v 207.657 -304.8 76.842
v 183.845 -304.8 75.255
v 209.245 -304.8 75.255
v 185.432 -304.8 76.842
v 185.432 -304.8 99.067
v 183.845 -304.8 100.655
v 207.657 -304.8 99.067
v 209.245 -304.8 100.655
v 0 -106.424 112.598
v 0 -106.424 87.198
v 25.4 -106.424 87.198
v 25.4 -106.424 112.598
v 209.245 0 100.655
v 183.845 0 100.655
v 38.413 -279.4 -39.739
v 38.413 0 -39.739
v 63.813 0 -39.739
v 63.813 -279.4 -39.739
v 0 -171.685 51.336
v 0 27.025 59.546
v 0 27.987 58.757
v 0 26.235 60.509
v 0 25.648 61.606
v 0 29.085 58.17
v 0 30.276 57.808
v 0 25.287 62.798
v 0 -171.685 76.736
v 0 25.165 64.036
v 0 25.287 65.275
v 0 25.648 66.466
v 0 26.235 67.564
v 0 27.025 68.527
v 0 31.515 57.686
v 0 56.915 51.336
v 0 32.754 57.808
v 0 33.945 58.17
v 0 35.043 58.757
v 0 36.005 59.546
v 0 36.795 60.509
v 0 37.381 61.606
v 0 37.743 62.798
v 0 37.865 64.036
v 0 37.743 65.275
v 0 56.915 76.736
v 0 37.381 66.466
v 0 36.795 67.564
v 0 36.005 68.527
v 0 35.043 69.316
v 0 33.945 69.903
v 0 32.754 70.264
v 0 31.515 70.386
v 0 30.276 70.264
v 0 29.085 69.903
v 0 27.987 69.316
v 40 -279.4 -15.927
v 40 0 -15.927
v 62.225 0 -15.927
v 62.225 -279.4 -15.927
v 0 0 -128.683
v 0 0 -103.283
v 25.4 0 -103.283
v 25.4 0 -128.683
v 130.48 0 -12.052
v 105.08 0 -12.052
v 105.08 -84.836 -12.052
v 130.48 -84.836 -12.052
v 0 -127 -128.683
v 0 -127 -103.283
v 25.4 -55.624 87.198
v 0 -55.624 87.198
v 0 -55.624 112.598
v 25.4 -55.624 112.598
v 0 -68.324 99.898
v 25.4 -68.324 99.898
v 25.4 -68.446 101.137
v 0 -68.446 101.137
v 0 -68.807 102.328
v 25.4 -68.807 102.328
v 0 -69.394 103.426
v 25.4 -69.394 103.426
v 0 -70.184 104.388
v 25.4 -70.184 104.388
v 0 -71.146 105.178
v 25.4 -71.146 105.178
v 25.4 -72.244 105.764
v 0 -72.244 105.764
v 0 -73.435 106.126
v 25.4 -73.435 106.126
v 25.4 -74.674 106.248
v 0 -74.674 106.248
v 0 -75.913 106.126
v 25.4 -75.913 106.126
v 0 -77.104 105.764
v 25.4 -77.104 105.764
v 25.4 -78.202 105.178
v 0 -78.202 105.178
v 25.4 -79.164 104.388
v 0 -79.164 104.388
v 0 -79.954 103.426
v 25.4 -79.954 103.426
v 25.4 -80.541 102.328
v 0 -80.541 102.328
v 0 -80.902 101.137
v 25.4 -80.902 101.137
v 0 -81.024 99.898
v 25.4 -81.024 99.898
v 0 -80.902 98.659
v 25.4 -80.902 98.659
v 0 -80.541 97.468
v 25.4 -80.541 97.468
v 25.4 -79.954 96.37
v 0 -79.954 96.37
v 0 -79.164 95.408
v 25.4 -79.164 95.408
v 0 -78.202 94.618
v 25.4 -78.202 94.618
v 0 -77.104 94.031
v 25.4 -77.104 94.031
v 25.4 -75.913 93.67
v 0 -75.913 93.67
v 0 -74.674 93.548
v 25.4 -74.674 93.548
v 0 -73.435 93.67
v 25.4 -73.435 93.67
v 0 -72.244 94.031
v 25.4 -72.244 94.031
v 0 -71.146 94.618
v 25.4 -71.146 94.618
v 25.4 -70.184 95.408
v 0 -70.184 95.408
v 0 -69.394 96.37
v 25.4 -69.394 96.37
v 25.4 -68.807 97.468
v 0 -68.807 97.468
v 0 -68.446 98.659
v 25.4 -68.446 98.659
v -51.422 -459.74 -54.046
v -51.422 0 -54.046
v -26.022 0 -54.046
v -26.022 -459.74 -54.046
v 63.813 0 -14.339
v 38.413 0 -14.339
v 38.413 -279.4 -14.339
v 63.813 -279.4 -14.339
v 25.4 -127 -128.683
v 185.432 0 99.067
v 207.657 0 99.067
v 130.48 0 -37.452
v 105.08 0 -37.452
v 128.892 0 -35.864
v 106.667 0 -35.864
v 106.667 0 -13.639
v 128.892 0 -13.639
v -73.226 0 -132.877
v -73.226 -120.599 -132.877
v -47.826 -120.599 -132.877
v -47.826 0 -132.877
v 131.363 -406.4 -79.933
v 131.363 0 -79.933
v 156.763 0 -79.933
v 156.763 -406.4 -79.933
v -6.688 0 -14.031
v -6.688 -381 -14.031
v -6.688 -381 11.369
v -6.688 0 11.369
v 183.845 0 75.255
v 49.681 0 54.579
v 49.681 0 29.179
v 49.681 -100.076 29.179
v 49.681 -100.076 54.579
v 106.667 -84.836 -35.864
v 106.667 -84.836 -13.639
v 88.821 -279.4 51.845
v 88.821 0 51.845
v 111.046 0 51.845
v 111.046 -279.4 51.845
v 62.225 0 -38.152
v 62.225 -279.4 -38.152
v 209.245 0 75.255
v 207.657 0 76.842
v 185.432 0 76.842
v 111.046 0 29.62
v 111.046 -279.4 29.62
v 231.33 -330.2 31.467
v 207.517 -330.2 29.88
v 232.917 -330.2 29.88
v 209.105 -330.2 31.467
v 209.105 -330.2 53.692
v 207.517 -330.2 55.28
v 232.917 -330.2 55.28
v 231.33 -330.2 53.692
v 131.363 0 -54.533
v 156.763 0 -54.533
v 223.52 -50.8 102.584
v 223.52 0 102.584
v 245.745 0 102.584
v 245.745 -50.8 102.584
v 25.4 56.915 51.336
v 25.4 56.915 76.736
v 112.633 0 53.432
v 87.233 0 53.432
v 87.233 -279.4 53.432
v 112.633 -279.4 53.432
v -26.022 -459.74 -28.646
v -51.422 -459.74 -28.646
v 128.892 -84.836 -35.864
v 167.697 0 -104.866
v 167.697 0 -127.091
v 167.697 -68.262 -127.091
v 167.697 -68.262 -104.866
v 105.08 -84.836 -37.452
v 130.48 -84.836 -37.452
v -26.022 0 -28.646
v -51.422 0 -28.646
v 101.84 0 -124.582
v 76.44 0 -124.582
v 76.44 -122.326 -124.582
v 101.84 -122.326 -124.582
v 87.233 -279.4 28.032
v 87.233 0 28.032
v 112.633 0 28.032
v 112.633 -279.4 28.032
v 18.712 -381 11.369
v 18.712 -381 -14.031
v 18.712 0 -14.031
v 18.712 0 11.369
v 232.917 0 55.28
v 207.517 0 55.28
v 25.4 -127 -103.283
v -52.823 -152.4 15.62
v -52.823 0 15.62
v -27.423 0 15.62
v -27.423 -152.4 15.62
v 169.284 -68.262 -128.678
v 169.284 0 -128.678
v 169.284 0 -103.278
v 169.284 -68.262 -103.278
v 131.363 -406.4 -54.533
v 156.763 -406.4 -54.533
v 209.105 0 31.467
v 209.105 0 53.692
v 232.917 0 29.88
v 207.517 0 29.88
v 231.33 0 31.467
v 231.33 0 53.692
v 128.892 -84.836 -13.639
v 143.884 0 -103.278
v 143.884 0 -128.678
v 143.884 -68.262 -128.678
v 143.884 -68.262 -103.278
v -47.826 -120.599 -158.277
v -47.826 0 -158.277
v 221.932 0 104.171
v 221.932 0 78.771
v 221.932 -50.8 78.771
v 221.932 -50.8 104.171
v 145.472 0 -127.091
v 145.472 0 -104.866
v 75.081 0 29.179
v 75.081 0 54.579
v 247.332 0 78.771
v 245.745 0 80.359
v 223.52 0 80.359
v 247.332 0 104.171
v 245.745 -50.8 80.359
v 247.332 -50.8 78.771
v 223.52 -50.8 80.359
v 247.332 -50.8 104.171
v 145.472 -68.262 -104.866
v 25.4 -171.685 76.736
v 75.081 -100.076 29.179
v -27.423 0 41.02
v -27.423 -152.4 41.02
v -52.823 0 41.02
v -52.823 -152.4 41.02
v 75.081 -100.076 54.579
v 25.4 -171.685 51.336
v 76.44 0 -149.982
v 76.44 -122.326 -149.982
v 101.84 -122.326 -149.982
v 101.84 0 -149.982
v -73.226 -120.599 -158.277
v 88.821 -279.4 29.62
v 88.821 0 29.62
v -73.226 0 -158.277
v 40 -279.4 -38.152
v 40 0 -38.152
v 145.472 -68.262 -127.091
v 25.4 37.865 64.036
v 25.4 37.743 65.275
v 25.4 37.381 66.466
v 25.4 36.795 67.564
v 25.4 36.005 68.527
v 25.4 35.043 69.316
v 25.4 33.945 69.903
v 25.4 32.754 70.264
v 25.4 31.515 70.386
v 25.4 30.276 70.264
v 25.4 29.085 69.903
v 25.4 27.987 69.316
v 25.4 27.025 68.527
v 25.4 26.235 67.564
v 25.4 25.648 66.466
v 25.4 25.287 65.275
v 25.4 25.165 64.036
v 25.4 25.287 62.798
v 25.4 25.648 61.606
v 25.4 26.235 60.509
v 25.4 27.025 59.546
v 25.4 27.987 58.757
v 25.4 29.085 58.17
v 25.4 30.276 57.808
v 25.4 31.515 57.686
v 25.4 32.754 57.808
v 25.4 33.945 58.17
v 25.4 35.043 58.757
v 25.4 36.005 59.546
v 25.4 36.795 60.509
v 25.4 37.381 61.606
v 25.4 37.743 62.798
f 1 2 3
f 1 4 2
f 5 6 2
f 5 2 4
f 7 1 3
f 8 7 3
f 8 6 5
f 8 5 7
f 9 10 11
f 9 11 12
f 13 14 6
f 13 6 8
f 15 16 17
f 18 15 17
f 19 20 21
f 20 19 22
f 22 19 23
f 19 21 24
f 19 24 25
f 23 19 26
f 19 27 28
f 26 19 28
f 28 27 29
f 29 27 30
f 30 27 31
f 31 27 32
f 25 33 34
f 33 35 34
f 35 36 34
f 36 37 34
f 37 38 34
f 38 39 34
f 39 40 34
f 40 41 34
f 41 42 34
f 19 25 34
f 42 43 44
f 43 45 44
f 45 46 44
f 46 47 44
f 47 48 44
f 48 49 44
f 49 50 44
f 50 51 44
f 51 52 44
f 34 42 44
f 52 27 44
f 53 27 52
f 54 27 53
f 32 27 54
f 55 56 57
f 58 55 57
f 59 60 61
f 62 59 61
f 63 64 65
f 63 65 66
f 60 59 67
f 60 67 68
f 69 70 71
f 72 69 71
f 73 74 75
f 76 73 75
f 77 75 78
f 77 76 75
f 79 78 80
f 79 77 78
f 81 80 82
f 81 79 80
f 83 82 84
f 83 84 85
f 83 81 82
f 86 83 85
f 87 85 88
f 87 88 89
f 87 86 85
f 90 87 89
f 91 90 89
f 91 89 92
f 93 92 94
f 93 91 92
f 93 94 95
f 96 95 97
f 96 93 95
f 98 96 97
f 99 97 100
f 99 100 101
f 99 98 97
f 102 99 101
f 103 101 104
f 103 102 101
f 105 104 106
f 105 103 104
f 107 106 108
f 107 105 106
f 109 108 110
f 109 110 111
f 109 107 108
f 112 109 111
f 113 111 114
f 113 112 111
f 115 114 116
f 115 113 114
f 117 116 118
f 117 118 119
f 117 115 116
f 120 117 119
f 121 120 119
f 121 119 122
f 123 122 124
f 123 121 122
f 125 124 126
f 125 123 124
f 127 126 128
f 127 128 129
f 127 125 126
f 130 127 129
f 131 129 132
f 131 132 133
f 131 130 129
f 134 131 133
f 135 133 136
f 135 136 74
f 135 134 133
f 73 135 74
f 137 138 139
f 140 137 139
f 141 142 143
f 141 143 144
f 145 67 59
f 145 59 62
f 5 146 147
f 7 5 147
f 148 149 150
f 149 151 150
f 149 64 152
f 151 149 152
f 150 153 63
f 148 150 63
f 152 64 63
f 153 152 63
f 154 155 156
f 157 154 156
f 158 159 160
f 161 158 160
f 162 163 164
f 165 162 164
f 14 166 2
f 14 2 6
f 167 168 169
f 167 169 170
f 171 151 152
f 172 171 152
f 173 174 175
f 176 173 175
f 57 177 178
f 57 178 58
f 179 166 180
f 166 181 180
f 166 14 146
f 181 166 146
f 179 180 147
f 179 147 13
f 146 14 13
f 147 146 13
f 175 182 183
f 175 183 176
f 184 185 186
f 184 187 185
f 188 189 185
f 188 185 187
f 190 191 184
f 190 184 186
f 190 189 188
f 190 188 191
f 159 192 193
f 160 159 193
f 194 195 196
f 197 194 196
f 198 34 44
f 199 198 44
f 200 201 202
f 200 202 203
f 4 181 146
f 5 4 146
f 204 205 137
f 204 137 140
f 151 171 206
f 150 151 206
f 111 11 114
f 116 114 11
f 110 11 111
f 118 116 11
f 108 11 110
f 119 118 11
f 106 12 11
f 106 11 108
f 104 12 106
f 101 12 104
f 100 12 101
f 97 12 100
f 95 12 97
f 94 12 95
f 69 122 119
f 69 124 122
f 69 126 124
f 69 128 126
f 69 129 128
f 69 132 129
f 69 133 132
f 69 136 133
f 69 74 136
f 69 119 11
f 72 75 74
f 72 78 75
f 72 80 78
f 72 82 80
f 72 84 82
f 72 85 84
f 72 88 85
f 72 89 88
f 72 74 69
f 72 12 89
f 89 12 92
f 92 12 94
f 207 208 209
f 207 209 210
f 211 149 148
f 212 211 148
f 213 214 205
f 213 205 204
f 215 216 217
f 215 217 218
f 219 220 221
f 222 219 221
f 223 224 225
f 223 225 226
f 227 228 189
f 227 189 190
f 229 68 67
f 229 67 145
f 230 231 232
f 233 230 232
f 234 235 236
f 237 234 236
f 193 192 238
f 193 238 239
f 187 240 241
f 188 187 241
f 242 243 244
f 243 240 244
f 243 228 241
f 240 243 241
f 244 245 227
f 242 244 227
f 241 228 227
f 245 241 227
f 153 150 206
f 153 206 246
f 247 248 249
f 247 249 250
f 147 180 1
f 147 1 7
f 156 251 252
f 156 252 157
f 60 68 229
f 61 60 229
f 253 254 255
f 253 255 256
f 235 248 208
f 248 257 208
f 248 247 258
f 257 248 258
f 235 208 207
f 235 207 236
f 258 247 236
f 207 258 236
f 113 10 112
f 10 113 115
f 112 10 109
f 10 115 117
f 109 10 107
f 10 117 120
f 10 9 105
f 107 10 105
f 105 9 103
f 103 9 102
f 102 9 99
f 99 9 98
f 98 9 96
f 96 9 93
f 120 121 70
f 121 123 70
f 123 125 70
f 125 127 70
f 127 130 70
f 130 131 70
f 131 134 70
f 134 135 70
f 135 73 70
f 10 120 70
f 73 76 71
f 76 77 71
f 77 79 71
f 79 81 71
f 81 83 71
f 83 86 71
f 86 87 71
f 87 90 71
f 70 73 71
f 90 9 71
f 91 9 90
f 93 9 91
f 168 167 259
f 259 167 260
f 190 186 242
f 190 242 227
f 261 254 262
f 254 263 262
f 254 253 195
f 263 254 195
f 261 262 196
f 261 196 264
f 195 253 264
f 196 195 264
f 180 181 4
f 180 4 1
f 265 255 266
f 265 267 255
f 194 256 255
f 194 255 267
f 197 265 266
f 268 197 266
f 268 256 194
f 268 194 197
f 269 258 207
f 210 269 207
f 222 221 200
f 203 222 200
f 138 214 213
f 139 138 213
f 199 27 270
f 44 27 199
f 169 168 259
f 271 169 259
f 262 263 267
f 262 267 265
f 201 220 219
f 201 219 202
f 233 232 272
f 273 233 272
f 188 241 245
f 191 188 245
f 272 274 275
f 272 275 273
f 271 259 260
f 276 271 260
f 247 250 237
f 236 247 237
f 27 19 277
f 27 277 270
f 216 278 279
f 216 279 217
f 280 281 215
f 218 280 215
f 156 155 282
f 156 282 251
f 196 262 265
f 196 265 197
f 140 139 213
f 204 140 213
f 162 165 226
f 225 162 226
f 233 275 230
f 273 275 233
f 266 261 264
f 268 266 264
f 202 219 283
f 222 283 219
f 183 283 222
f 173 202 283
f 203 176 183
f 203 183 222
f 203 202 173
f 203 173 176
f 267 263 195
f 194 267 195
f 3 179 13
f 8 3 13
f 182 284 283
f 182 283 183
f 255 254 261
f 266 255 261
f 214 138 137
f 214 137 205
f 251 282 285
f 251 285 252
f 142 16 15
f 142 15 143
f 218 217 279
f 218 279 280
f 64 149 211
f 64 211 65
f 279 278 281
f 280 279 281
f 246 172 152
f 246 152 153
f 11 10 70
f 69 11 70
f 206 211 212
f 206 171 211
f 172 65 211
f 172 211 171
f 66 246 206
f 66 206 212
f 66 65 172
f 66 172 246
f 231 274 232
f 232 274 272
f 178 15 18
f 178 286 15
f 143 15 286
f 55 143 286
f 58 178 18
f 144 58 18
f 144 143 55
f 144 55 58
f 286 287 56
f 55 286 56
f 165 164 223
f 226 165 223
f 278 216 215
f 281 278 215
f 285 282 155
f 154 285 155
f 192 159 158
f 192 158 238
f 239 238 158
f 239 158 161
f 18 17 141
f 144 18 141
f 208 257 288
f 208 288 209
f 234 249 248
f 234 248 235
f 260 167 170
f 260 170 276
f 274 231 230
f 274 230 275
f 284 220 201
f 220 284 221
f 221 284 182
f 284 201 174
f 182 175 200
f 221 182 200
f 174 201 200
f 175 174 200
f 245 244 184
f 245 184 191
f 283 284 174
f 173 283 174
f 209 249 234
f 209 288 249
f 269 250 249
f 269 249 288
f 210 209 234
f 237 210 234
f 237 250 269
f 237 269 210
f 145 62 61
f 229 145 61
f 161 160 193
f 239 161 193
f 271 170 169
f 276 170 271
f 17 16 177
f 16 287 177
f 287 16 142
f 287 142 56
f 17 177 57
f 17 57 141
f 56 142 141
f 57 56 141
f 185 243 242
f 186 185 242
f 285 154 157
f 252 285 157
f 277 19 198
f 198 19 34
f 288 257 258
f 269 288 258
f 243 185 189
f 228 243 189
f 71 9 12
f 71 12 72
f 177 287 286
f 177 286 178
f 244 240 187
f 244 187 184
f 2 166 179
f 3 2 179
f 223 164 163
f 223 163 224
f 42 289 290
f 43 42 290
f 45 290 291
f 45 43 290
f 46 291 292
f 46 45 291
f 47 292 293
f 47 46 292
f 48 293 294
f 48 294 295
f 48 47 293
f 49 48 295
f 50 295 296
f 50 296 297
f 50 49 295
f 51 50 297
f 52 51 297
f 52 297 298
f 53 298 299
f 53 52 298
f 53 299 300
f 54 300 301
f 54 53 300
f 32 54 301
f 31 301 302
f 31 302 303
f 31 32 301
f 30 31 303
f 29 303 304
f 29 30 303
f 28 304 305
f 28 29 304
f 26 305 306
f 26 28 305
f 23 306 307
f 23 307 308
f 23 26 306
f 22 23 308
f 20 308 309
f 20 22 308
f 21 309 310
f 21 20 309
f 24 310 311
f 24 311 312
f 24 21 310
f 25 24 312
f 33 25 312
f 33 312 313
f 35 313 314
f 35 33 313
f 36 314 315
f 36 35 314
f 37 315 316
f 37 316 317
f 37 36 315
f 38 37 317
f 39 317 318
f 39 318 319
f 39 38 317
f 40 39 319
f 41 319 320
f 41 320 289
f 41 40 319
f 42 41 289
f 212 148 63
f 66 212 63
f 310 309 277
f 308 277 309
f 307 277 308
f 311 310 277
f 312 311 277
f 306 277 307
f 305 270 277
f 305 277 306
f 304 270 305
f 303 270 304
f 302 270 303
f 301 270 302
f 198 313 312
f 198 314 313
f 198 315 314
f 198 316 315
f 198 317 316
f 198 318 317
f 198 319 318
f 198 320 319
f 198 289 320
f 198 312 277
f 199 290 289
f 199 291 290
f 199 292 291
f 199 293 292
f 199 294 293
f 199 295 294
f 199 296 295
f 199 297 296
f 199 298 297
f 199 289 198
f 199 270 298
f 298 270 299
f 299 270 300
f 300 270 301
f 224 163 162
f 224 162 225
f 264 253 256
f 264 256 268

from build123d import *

# Parameters (mm, degrees)
F0_W      = 25.4
F0_H      = 25.4
F1_DEPTH  = 381
F2_W      = 25.4
F2_H      = 25.4
F2_W_2    = 22.225
F2_H_2    = 22.225
F3_DEPTH  = 279.4
F4_W      = 25.4
F4_H      = 25.4
F5_DEPTH  = 152.4
F6_W      = 228.6
F6_H      = 25.4
F6_R      = 6.35
F7_DEPTH  = 25.4
F8_W      = 50.8
F8_H      = 25.4
F8_R      = 6.35
F9_DEPTH  = 25.4
F10_W     = 25.4
F10_H     = 25.4
F11_DEPTH = 459.74
F12_W     = 25.4
F12_H     = 25.4
F13_DEPTH = 100.076
F14_W     = 25.4
F14_H     = 25.4
F15_DEPTH = 122.3264
F16_W     = 25.4
F16_H     = 25.4
F17_DEPTH = 120.5992
F18_W     = 25.4
F18_H     = 25.4
F19_DEPTH = 127
F20_W     = 25.4
F20_H     = 25.4
F21_DEPTH = 406.4
F22_W     = 25.4
F22_H     = 25.4
F22_W_2   = 22.225
F22_H_2   = 22.225
F23_DEPTH = 279.4
F24_W     = 25.4
F24_H     = 25.4
F24_W_2   = 22.225
F24_H_2   = 22.225
F25_DEPTH = 304.8
F26_W     = 25.4
F26_H     = 25.4
F26_W_2   = 22.225
F26_H_2   = 22.225
F27_DEPTH = 50.8
F28_W     = 25.4
F28_H     = 25.4
F28_W_2   = 22.225
F28_H_2   = 22.225
F29_DEPTH = 330.2
F30_W     = 25.4
F30_H     = 25.4
F30_W_2   = 22.225
F30_H_2   = 22.225
F31_DEPTH = 84.836
F32_W     = 25.4
F32_H     = 25.4
F32_W_2   = 22.225
F32_H_2   = 22.225
F33_DEPTH = 68.2625


with BuildPart() as f1:
    # F0 (on Front) → F1 (new body)
    with BuildSketch(Plane.XZ):
        with Locations((6.012416, -1.331083)):
            Rectangle(F0_W, F0_H)
    extrude(amount=F1_DEPTH)


with BuildPart() as f3:
    # F2 (on Front) → F3 (new body)
    with BuildSketch(Plane.XZ):
        with Locations((51.112667, -27.039096)):
            Rectangle(F2_W, F2_H)
        with Locations((51.112667, -27.039096)):
            Rectangle(F2_W_2, F2_H_2, mode=Mode.SUBTRACT)
    extrude(amount=F3_DEPTH)


with BuildPart() as f5:
    # F4 (on Front) → F5 (new body)
    with BuildSketch(Plane.XZ):
        with Locations((-40.122539, 28.319776)):
            Rectangle(F4_W, F4_H)
    extrude(amount=F5_DEPTH)


with BuildPart() as f7:
    # F6 (on Right) → F7 (new body)
    with BuildSketch(Plane.YZ):
        with Locations((-57.385214, 64.036405)):
            Rectangle(F6_W, F6_H)
        with Locations((31.514786, 64.036405)):
            Circle(F6_R, mode=Mode.SUBTRACT)
    extrude(amount=F7_DEPTH)


with BuildPart() as f9:
    # F8 (on Right) → F9 (new body)
    with BuildSketch(Plane.YZ):
        with Locations((-81.024057, 99.897847)):
            Rectangle(F8_W, F8_H)
        with Locations((-74.674057, 99.897847)):
            Circle(F8_R, mode=Mode.SUBTRACT)
    extrude(amount=F9_DEPTH)


with BuildPart() as f11:
    # F10 (on Front) → F11 (new body)
    with BuildSketch(Plane.XZ):
        with Locations((-38.722203, -41.346163)):
            Rectangle(F10_W, F10_H)
    extrude(amount=F11_DEPTH)


with BuildPart() as f13:
    # F12 (on Front) → F13 (new body)
    with BuildSketch(Plane.XZ):
        with Locations((62.380522, 41.878674)):
            Rectangle(F12_W, F12_H)
    extrude(amount=F13_DEPTH)


with BuildPart() as f15:
    # F14 (on Front) → F15 (new body)
    with BuildSketch(Plane.XZ):
        with Locations((89.140385, -137.282215)):
            Rectangle(F14_W, F14_H)
    extrude(amount=F15_DEPTH)


with BuildPart() as f17:
    # F16 (on Front) → F17 (new body)
    with BuildSketch(Plane.XZ):
        with Locations((-60.525931, -145.576701)):
            Rectangle(F16_W, F16_H)
    extrude(amount=F17_DEPTH)


with BuildPart() as f19:
    # F18 (on Front) → F19 (new body)
    with BuildSketch(Plane.XZ):
        with Locations((12.7, -115.983012)):
            Rectangle(F18_W, F18_H)
    extrude(amount=F19_DEPTH)


with BuildPart() as f21:
    # F20 (on Front) → F21 (new body)
    with BuildSketch(Plane.XZ):
        with Locations((144.062687, -67.233101)):
            Rectangle(F20_W, F20_H)
    extrude(amount=F21_DEPTH)


with BuildPart() as f23:
    # F22 (on Front) → F23 (new body)
    with BuildSketch(Plane.XZ):
        with Locations((99.933479, 40.732481)):
            Rectangle(F22_W, F22_H)
        with Locations((99.933479, 40.732481)):
            Rectangle(F22_W_2, F22_H_2, mode=Mode.SUBTRACT)
    extrude(amount=F23_DEPTH)


with BuildPart() as f25:
    # F24 (on Front) → F25 (new body)
    with BuildSketch(Plane.XZ):
        with Locations((196.544535, 87.954864)):
            Rectangle(F24_W, F24_H)
        with Locations((196.544535, 87.954864)):
            Rectangle(F24_W_2, F24_H_2, mode=Mode.SUBTRACT)
    extrude(amount=F25_DEPTH)


with BuildPart() as f27:
    # F26 (on Front) → F27 (new body)
    with BuildSketch(Plane.XZ):
        with Locations((234.632495, 91.471016)):
            Rectangle(F26_W, F26_H)
        with Locations((234.632495, 91.471016)):
            Rectangle(F26_W_2, F26_H_2, mode=Mode.SUBTRACT)
    extrude(amount=F27_DEPTH)


with BuildPart() as f29:
    # F28 (on Front) → F29 (new body)
    with BuildSketch(Plane.XZ):
        with Locations((220.217026, 42.579796)):
            Rectangle(F28_W, F28_H)
        with Locations((220.217026, 42.579796)):
            Rectangle(F28_W_2, F28_H_2, mode=Mode.SUBTRACT)
    extrude(amount=F29_DEPTH)


with BuildPart() as f31:
    # F30 (on Front) → F31 (new body)
    with BuildSketch(Plane.XZ):
        with Locations((117.779925, -24.751918)):
            Rectangle(F30_W, F30_H)
        with Locations((117.779925, -24.751918)):
            Rectangle(F30_W_2, F30_H_2, mode=Mode.SUBTRACT)
    extrude(amount=F31_DEPTH)


with BuildPart() as f33:
    # F32 (on Front) → F33 (new body)
    with BuildSketch(Plane.XZ):
        with Locations((156.584144, -115.978435)):
            Rectangle(F32_W, F32_H)
        with Locations((156.584144, -115.978435)):
            Rectangle(F32_W_2, F32_H_2, mode=Mode.SUBTRACT)
    extrude(amount=F33_DEPTH)


solid = Compound([f1.part, f3.part, f5.part, f7.part, f9.part, f11.part, f13.part, f15.part, f17.part, f19.part, f21.part, f23.part, f25.part, f27.part, f29.part, f31.part, f33.part])
